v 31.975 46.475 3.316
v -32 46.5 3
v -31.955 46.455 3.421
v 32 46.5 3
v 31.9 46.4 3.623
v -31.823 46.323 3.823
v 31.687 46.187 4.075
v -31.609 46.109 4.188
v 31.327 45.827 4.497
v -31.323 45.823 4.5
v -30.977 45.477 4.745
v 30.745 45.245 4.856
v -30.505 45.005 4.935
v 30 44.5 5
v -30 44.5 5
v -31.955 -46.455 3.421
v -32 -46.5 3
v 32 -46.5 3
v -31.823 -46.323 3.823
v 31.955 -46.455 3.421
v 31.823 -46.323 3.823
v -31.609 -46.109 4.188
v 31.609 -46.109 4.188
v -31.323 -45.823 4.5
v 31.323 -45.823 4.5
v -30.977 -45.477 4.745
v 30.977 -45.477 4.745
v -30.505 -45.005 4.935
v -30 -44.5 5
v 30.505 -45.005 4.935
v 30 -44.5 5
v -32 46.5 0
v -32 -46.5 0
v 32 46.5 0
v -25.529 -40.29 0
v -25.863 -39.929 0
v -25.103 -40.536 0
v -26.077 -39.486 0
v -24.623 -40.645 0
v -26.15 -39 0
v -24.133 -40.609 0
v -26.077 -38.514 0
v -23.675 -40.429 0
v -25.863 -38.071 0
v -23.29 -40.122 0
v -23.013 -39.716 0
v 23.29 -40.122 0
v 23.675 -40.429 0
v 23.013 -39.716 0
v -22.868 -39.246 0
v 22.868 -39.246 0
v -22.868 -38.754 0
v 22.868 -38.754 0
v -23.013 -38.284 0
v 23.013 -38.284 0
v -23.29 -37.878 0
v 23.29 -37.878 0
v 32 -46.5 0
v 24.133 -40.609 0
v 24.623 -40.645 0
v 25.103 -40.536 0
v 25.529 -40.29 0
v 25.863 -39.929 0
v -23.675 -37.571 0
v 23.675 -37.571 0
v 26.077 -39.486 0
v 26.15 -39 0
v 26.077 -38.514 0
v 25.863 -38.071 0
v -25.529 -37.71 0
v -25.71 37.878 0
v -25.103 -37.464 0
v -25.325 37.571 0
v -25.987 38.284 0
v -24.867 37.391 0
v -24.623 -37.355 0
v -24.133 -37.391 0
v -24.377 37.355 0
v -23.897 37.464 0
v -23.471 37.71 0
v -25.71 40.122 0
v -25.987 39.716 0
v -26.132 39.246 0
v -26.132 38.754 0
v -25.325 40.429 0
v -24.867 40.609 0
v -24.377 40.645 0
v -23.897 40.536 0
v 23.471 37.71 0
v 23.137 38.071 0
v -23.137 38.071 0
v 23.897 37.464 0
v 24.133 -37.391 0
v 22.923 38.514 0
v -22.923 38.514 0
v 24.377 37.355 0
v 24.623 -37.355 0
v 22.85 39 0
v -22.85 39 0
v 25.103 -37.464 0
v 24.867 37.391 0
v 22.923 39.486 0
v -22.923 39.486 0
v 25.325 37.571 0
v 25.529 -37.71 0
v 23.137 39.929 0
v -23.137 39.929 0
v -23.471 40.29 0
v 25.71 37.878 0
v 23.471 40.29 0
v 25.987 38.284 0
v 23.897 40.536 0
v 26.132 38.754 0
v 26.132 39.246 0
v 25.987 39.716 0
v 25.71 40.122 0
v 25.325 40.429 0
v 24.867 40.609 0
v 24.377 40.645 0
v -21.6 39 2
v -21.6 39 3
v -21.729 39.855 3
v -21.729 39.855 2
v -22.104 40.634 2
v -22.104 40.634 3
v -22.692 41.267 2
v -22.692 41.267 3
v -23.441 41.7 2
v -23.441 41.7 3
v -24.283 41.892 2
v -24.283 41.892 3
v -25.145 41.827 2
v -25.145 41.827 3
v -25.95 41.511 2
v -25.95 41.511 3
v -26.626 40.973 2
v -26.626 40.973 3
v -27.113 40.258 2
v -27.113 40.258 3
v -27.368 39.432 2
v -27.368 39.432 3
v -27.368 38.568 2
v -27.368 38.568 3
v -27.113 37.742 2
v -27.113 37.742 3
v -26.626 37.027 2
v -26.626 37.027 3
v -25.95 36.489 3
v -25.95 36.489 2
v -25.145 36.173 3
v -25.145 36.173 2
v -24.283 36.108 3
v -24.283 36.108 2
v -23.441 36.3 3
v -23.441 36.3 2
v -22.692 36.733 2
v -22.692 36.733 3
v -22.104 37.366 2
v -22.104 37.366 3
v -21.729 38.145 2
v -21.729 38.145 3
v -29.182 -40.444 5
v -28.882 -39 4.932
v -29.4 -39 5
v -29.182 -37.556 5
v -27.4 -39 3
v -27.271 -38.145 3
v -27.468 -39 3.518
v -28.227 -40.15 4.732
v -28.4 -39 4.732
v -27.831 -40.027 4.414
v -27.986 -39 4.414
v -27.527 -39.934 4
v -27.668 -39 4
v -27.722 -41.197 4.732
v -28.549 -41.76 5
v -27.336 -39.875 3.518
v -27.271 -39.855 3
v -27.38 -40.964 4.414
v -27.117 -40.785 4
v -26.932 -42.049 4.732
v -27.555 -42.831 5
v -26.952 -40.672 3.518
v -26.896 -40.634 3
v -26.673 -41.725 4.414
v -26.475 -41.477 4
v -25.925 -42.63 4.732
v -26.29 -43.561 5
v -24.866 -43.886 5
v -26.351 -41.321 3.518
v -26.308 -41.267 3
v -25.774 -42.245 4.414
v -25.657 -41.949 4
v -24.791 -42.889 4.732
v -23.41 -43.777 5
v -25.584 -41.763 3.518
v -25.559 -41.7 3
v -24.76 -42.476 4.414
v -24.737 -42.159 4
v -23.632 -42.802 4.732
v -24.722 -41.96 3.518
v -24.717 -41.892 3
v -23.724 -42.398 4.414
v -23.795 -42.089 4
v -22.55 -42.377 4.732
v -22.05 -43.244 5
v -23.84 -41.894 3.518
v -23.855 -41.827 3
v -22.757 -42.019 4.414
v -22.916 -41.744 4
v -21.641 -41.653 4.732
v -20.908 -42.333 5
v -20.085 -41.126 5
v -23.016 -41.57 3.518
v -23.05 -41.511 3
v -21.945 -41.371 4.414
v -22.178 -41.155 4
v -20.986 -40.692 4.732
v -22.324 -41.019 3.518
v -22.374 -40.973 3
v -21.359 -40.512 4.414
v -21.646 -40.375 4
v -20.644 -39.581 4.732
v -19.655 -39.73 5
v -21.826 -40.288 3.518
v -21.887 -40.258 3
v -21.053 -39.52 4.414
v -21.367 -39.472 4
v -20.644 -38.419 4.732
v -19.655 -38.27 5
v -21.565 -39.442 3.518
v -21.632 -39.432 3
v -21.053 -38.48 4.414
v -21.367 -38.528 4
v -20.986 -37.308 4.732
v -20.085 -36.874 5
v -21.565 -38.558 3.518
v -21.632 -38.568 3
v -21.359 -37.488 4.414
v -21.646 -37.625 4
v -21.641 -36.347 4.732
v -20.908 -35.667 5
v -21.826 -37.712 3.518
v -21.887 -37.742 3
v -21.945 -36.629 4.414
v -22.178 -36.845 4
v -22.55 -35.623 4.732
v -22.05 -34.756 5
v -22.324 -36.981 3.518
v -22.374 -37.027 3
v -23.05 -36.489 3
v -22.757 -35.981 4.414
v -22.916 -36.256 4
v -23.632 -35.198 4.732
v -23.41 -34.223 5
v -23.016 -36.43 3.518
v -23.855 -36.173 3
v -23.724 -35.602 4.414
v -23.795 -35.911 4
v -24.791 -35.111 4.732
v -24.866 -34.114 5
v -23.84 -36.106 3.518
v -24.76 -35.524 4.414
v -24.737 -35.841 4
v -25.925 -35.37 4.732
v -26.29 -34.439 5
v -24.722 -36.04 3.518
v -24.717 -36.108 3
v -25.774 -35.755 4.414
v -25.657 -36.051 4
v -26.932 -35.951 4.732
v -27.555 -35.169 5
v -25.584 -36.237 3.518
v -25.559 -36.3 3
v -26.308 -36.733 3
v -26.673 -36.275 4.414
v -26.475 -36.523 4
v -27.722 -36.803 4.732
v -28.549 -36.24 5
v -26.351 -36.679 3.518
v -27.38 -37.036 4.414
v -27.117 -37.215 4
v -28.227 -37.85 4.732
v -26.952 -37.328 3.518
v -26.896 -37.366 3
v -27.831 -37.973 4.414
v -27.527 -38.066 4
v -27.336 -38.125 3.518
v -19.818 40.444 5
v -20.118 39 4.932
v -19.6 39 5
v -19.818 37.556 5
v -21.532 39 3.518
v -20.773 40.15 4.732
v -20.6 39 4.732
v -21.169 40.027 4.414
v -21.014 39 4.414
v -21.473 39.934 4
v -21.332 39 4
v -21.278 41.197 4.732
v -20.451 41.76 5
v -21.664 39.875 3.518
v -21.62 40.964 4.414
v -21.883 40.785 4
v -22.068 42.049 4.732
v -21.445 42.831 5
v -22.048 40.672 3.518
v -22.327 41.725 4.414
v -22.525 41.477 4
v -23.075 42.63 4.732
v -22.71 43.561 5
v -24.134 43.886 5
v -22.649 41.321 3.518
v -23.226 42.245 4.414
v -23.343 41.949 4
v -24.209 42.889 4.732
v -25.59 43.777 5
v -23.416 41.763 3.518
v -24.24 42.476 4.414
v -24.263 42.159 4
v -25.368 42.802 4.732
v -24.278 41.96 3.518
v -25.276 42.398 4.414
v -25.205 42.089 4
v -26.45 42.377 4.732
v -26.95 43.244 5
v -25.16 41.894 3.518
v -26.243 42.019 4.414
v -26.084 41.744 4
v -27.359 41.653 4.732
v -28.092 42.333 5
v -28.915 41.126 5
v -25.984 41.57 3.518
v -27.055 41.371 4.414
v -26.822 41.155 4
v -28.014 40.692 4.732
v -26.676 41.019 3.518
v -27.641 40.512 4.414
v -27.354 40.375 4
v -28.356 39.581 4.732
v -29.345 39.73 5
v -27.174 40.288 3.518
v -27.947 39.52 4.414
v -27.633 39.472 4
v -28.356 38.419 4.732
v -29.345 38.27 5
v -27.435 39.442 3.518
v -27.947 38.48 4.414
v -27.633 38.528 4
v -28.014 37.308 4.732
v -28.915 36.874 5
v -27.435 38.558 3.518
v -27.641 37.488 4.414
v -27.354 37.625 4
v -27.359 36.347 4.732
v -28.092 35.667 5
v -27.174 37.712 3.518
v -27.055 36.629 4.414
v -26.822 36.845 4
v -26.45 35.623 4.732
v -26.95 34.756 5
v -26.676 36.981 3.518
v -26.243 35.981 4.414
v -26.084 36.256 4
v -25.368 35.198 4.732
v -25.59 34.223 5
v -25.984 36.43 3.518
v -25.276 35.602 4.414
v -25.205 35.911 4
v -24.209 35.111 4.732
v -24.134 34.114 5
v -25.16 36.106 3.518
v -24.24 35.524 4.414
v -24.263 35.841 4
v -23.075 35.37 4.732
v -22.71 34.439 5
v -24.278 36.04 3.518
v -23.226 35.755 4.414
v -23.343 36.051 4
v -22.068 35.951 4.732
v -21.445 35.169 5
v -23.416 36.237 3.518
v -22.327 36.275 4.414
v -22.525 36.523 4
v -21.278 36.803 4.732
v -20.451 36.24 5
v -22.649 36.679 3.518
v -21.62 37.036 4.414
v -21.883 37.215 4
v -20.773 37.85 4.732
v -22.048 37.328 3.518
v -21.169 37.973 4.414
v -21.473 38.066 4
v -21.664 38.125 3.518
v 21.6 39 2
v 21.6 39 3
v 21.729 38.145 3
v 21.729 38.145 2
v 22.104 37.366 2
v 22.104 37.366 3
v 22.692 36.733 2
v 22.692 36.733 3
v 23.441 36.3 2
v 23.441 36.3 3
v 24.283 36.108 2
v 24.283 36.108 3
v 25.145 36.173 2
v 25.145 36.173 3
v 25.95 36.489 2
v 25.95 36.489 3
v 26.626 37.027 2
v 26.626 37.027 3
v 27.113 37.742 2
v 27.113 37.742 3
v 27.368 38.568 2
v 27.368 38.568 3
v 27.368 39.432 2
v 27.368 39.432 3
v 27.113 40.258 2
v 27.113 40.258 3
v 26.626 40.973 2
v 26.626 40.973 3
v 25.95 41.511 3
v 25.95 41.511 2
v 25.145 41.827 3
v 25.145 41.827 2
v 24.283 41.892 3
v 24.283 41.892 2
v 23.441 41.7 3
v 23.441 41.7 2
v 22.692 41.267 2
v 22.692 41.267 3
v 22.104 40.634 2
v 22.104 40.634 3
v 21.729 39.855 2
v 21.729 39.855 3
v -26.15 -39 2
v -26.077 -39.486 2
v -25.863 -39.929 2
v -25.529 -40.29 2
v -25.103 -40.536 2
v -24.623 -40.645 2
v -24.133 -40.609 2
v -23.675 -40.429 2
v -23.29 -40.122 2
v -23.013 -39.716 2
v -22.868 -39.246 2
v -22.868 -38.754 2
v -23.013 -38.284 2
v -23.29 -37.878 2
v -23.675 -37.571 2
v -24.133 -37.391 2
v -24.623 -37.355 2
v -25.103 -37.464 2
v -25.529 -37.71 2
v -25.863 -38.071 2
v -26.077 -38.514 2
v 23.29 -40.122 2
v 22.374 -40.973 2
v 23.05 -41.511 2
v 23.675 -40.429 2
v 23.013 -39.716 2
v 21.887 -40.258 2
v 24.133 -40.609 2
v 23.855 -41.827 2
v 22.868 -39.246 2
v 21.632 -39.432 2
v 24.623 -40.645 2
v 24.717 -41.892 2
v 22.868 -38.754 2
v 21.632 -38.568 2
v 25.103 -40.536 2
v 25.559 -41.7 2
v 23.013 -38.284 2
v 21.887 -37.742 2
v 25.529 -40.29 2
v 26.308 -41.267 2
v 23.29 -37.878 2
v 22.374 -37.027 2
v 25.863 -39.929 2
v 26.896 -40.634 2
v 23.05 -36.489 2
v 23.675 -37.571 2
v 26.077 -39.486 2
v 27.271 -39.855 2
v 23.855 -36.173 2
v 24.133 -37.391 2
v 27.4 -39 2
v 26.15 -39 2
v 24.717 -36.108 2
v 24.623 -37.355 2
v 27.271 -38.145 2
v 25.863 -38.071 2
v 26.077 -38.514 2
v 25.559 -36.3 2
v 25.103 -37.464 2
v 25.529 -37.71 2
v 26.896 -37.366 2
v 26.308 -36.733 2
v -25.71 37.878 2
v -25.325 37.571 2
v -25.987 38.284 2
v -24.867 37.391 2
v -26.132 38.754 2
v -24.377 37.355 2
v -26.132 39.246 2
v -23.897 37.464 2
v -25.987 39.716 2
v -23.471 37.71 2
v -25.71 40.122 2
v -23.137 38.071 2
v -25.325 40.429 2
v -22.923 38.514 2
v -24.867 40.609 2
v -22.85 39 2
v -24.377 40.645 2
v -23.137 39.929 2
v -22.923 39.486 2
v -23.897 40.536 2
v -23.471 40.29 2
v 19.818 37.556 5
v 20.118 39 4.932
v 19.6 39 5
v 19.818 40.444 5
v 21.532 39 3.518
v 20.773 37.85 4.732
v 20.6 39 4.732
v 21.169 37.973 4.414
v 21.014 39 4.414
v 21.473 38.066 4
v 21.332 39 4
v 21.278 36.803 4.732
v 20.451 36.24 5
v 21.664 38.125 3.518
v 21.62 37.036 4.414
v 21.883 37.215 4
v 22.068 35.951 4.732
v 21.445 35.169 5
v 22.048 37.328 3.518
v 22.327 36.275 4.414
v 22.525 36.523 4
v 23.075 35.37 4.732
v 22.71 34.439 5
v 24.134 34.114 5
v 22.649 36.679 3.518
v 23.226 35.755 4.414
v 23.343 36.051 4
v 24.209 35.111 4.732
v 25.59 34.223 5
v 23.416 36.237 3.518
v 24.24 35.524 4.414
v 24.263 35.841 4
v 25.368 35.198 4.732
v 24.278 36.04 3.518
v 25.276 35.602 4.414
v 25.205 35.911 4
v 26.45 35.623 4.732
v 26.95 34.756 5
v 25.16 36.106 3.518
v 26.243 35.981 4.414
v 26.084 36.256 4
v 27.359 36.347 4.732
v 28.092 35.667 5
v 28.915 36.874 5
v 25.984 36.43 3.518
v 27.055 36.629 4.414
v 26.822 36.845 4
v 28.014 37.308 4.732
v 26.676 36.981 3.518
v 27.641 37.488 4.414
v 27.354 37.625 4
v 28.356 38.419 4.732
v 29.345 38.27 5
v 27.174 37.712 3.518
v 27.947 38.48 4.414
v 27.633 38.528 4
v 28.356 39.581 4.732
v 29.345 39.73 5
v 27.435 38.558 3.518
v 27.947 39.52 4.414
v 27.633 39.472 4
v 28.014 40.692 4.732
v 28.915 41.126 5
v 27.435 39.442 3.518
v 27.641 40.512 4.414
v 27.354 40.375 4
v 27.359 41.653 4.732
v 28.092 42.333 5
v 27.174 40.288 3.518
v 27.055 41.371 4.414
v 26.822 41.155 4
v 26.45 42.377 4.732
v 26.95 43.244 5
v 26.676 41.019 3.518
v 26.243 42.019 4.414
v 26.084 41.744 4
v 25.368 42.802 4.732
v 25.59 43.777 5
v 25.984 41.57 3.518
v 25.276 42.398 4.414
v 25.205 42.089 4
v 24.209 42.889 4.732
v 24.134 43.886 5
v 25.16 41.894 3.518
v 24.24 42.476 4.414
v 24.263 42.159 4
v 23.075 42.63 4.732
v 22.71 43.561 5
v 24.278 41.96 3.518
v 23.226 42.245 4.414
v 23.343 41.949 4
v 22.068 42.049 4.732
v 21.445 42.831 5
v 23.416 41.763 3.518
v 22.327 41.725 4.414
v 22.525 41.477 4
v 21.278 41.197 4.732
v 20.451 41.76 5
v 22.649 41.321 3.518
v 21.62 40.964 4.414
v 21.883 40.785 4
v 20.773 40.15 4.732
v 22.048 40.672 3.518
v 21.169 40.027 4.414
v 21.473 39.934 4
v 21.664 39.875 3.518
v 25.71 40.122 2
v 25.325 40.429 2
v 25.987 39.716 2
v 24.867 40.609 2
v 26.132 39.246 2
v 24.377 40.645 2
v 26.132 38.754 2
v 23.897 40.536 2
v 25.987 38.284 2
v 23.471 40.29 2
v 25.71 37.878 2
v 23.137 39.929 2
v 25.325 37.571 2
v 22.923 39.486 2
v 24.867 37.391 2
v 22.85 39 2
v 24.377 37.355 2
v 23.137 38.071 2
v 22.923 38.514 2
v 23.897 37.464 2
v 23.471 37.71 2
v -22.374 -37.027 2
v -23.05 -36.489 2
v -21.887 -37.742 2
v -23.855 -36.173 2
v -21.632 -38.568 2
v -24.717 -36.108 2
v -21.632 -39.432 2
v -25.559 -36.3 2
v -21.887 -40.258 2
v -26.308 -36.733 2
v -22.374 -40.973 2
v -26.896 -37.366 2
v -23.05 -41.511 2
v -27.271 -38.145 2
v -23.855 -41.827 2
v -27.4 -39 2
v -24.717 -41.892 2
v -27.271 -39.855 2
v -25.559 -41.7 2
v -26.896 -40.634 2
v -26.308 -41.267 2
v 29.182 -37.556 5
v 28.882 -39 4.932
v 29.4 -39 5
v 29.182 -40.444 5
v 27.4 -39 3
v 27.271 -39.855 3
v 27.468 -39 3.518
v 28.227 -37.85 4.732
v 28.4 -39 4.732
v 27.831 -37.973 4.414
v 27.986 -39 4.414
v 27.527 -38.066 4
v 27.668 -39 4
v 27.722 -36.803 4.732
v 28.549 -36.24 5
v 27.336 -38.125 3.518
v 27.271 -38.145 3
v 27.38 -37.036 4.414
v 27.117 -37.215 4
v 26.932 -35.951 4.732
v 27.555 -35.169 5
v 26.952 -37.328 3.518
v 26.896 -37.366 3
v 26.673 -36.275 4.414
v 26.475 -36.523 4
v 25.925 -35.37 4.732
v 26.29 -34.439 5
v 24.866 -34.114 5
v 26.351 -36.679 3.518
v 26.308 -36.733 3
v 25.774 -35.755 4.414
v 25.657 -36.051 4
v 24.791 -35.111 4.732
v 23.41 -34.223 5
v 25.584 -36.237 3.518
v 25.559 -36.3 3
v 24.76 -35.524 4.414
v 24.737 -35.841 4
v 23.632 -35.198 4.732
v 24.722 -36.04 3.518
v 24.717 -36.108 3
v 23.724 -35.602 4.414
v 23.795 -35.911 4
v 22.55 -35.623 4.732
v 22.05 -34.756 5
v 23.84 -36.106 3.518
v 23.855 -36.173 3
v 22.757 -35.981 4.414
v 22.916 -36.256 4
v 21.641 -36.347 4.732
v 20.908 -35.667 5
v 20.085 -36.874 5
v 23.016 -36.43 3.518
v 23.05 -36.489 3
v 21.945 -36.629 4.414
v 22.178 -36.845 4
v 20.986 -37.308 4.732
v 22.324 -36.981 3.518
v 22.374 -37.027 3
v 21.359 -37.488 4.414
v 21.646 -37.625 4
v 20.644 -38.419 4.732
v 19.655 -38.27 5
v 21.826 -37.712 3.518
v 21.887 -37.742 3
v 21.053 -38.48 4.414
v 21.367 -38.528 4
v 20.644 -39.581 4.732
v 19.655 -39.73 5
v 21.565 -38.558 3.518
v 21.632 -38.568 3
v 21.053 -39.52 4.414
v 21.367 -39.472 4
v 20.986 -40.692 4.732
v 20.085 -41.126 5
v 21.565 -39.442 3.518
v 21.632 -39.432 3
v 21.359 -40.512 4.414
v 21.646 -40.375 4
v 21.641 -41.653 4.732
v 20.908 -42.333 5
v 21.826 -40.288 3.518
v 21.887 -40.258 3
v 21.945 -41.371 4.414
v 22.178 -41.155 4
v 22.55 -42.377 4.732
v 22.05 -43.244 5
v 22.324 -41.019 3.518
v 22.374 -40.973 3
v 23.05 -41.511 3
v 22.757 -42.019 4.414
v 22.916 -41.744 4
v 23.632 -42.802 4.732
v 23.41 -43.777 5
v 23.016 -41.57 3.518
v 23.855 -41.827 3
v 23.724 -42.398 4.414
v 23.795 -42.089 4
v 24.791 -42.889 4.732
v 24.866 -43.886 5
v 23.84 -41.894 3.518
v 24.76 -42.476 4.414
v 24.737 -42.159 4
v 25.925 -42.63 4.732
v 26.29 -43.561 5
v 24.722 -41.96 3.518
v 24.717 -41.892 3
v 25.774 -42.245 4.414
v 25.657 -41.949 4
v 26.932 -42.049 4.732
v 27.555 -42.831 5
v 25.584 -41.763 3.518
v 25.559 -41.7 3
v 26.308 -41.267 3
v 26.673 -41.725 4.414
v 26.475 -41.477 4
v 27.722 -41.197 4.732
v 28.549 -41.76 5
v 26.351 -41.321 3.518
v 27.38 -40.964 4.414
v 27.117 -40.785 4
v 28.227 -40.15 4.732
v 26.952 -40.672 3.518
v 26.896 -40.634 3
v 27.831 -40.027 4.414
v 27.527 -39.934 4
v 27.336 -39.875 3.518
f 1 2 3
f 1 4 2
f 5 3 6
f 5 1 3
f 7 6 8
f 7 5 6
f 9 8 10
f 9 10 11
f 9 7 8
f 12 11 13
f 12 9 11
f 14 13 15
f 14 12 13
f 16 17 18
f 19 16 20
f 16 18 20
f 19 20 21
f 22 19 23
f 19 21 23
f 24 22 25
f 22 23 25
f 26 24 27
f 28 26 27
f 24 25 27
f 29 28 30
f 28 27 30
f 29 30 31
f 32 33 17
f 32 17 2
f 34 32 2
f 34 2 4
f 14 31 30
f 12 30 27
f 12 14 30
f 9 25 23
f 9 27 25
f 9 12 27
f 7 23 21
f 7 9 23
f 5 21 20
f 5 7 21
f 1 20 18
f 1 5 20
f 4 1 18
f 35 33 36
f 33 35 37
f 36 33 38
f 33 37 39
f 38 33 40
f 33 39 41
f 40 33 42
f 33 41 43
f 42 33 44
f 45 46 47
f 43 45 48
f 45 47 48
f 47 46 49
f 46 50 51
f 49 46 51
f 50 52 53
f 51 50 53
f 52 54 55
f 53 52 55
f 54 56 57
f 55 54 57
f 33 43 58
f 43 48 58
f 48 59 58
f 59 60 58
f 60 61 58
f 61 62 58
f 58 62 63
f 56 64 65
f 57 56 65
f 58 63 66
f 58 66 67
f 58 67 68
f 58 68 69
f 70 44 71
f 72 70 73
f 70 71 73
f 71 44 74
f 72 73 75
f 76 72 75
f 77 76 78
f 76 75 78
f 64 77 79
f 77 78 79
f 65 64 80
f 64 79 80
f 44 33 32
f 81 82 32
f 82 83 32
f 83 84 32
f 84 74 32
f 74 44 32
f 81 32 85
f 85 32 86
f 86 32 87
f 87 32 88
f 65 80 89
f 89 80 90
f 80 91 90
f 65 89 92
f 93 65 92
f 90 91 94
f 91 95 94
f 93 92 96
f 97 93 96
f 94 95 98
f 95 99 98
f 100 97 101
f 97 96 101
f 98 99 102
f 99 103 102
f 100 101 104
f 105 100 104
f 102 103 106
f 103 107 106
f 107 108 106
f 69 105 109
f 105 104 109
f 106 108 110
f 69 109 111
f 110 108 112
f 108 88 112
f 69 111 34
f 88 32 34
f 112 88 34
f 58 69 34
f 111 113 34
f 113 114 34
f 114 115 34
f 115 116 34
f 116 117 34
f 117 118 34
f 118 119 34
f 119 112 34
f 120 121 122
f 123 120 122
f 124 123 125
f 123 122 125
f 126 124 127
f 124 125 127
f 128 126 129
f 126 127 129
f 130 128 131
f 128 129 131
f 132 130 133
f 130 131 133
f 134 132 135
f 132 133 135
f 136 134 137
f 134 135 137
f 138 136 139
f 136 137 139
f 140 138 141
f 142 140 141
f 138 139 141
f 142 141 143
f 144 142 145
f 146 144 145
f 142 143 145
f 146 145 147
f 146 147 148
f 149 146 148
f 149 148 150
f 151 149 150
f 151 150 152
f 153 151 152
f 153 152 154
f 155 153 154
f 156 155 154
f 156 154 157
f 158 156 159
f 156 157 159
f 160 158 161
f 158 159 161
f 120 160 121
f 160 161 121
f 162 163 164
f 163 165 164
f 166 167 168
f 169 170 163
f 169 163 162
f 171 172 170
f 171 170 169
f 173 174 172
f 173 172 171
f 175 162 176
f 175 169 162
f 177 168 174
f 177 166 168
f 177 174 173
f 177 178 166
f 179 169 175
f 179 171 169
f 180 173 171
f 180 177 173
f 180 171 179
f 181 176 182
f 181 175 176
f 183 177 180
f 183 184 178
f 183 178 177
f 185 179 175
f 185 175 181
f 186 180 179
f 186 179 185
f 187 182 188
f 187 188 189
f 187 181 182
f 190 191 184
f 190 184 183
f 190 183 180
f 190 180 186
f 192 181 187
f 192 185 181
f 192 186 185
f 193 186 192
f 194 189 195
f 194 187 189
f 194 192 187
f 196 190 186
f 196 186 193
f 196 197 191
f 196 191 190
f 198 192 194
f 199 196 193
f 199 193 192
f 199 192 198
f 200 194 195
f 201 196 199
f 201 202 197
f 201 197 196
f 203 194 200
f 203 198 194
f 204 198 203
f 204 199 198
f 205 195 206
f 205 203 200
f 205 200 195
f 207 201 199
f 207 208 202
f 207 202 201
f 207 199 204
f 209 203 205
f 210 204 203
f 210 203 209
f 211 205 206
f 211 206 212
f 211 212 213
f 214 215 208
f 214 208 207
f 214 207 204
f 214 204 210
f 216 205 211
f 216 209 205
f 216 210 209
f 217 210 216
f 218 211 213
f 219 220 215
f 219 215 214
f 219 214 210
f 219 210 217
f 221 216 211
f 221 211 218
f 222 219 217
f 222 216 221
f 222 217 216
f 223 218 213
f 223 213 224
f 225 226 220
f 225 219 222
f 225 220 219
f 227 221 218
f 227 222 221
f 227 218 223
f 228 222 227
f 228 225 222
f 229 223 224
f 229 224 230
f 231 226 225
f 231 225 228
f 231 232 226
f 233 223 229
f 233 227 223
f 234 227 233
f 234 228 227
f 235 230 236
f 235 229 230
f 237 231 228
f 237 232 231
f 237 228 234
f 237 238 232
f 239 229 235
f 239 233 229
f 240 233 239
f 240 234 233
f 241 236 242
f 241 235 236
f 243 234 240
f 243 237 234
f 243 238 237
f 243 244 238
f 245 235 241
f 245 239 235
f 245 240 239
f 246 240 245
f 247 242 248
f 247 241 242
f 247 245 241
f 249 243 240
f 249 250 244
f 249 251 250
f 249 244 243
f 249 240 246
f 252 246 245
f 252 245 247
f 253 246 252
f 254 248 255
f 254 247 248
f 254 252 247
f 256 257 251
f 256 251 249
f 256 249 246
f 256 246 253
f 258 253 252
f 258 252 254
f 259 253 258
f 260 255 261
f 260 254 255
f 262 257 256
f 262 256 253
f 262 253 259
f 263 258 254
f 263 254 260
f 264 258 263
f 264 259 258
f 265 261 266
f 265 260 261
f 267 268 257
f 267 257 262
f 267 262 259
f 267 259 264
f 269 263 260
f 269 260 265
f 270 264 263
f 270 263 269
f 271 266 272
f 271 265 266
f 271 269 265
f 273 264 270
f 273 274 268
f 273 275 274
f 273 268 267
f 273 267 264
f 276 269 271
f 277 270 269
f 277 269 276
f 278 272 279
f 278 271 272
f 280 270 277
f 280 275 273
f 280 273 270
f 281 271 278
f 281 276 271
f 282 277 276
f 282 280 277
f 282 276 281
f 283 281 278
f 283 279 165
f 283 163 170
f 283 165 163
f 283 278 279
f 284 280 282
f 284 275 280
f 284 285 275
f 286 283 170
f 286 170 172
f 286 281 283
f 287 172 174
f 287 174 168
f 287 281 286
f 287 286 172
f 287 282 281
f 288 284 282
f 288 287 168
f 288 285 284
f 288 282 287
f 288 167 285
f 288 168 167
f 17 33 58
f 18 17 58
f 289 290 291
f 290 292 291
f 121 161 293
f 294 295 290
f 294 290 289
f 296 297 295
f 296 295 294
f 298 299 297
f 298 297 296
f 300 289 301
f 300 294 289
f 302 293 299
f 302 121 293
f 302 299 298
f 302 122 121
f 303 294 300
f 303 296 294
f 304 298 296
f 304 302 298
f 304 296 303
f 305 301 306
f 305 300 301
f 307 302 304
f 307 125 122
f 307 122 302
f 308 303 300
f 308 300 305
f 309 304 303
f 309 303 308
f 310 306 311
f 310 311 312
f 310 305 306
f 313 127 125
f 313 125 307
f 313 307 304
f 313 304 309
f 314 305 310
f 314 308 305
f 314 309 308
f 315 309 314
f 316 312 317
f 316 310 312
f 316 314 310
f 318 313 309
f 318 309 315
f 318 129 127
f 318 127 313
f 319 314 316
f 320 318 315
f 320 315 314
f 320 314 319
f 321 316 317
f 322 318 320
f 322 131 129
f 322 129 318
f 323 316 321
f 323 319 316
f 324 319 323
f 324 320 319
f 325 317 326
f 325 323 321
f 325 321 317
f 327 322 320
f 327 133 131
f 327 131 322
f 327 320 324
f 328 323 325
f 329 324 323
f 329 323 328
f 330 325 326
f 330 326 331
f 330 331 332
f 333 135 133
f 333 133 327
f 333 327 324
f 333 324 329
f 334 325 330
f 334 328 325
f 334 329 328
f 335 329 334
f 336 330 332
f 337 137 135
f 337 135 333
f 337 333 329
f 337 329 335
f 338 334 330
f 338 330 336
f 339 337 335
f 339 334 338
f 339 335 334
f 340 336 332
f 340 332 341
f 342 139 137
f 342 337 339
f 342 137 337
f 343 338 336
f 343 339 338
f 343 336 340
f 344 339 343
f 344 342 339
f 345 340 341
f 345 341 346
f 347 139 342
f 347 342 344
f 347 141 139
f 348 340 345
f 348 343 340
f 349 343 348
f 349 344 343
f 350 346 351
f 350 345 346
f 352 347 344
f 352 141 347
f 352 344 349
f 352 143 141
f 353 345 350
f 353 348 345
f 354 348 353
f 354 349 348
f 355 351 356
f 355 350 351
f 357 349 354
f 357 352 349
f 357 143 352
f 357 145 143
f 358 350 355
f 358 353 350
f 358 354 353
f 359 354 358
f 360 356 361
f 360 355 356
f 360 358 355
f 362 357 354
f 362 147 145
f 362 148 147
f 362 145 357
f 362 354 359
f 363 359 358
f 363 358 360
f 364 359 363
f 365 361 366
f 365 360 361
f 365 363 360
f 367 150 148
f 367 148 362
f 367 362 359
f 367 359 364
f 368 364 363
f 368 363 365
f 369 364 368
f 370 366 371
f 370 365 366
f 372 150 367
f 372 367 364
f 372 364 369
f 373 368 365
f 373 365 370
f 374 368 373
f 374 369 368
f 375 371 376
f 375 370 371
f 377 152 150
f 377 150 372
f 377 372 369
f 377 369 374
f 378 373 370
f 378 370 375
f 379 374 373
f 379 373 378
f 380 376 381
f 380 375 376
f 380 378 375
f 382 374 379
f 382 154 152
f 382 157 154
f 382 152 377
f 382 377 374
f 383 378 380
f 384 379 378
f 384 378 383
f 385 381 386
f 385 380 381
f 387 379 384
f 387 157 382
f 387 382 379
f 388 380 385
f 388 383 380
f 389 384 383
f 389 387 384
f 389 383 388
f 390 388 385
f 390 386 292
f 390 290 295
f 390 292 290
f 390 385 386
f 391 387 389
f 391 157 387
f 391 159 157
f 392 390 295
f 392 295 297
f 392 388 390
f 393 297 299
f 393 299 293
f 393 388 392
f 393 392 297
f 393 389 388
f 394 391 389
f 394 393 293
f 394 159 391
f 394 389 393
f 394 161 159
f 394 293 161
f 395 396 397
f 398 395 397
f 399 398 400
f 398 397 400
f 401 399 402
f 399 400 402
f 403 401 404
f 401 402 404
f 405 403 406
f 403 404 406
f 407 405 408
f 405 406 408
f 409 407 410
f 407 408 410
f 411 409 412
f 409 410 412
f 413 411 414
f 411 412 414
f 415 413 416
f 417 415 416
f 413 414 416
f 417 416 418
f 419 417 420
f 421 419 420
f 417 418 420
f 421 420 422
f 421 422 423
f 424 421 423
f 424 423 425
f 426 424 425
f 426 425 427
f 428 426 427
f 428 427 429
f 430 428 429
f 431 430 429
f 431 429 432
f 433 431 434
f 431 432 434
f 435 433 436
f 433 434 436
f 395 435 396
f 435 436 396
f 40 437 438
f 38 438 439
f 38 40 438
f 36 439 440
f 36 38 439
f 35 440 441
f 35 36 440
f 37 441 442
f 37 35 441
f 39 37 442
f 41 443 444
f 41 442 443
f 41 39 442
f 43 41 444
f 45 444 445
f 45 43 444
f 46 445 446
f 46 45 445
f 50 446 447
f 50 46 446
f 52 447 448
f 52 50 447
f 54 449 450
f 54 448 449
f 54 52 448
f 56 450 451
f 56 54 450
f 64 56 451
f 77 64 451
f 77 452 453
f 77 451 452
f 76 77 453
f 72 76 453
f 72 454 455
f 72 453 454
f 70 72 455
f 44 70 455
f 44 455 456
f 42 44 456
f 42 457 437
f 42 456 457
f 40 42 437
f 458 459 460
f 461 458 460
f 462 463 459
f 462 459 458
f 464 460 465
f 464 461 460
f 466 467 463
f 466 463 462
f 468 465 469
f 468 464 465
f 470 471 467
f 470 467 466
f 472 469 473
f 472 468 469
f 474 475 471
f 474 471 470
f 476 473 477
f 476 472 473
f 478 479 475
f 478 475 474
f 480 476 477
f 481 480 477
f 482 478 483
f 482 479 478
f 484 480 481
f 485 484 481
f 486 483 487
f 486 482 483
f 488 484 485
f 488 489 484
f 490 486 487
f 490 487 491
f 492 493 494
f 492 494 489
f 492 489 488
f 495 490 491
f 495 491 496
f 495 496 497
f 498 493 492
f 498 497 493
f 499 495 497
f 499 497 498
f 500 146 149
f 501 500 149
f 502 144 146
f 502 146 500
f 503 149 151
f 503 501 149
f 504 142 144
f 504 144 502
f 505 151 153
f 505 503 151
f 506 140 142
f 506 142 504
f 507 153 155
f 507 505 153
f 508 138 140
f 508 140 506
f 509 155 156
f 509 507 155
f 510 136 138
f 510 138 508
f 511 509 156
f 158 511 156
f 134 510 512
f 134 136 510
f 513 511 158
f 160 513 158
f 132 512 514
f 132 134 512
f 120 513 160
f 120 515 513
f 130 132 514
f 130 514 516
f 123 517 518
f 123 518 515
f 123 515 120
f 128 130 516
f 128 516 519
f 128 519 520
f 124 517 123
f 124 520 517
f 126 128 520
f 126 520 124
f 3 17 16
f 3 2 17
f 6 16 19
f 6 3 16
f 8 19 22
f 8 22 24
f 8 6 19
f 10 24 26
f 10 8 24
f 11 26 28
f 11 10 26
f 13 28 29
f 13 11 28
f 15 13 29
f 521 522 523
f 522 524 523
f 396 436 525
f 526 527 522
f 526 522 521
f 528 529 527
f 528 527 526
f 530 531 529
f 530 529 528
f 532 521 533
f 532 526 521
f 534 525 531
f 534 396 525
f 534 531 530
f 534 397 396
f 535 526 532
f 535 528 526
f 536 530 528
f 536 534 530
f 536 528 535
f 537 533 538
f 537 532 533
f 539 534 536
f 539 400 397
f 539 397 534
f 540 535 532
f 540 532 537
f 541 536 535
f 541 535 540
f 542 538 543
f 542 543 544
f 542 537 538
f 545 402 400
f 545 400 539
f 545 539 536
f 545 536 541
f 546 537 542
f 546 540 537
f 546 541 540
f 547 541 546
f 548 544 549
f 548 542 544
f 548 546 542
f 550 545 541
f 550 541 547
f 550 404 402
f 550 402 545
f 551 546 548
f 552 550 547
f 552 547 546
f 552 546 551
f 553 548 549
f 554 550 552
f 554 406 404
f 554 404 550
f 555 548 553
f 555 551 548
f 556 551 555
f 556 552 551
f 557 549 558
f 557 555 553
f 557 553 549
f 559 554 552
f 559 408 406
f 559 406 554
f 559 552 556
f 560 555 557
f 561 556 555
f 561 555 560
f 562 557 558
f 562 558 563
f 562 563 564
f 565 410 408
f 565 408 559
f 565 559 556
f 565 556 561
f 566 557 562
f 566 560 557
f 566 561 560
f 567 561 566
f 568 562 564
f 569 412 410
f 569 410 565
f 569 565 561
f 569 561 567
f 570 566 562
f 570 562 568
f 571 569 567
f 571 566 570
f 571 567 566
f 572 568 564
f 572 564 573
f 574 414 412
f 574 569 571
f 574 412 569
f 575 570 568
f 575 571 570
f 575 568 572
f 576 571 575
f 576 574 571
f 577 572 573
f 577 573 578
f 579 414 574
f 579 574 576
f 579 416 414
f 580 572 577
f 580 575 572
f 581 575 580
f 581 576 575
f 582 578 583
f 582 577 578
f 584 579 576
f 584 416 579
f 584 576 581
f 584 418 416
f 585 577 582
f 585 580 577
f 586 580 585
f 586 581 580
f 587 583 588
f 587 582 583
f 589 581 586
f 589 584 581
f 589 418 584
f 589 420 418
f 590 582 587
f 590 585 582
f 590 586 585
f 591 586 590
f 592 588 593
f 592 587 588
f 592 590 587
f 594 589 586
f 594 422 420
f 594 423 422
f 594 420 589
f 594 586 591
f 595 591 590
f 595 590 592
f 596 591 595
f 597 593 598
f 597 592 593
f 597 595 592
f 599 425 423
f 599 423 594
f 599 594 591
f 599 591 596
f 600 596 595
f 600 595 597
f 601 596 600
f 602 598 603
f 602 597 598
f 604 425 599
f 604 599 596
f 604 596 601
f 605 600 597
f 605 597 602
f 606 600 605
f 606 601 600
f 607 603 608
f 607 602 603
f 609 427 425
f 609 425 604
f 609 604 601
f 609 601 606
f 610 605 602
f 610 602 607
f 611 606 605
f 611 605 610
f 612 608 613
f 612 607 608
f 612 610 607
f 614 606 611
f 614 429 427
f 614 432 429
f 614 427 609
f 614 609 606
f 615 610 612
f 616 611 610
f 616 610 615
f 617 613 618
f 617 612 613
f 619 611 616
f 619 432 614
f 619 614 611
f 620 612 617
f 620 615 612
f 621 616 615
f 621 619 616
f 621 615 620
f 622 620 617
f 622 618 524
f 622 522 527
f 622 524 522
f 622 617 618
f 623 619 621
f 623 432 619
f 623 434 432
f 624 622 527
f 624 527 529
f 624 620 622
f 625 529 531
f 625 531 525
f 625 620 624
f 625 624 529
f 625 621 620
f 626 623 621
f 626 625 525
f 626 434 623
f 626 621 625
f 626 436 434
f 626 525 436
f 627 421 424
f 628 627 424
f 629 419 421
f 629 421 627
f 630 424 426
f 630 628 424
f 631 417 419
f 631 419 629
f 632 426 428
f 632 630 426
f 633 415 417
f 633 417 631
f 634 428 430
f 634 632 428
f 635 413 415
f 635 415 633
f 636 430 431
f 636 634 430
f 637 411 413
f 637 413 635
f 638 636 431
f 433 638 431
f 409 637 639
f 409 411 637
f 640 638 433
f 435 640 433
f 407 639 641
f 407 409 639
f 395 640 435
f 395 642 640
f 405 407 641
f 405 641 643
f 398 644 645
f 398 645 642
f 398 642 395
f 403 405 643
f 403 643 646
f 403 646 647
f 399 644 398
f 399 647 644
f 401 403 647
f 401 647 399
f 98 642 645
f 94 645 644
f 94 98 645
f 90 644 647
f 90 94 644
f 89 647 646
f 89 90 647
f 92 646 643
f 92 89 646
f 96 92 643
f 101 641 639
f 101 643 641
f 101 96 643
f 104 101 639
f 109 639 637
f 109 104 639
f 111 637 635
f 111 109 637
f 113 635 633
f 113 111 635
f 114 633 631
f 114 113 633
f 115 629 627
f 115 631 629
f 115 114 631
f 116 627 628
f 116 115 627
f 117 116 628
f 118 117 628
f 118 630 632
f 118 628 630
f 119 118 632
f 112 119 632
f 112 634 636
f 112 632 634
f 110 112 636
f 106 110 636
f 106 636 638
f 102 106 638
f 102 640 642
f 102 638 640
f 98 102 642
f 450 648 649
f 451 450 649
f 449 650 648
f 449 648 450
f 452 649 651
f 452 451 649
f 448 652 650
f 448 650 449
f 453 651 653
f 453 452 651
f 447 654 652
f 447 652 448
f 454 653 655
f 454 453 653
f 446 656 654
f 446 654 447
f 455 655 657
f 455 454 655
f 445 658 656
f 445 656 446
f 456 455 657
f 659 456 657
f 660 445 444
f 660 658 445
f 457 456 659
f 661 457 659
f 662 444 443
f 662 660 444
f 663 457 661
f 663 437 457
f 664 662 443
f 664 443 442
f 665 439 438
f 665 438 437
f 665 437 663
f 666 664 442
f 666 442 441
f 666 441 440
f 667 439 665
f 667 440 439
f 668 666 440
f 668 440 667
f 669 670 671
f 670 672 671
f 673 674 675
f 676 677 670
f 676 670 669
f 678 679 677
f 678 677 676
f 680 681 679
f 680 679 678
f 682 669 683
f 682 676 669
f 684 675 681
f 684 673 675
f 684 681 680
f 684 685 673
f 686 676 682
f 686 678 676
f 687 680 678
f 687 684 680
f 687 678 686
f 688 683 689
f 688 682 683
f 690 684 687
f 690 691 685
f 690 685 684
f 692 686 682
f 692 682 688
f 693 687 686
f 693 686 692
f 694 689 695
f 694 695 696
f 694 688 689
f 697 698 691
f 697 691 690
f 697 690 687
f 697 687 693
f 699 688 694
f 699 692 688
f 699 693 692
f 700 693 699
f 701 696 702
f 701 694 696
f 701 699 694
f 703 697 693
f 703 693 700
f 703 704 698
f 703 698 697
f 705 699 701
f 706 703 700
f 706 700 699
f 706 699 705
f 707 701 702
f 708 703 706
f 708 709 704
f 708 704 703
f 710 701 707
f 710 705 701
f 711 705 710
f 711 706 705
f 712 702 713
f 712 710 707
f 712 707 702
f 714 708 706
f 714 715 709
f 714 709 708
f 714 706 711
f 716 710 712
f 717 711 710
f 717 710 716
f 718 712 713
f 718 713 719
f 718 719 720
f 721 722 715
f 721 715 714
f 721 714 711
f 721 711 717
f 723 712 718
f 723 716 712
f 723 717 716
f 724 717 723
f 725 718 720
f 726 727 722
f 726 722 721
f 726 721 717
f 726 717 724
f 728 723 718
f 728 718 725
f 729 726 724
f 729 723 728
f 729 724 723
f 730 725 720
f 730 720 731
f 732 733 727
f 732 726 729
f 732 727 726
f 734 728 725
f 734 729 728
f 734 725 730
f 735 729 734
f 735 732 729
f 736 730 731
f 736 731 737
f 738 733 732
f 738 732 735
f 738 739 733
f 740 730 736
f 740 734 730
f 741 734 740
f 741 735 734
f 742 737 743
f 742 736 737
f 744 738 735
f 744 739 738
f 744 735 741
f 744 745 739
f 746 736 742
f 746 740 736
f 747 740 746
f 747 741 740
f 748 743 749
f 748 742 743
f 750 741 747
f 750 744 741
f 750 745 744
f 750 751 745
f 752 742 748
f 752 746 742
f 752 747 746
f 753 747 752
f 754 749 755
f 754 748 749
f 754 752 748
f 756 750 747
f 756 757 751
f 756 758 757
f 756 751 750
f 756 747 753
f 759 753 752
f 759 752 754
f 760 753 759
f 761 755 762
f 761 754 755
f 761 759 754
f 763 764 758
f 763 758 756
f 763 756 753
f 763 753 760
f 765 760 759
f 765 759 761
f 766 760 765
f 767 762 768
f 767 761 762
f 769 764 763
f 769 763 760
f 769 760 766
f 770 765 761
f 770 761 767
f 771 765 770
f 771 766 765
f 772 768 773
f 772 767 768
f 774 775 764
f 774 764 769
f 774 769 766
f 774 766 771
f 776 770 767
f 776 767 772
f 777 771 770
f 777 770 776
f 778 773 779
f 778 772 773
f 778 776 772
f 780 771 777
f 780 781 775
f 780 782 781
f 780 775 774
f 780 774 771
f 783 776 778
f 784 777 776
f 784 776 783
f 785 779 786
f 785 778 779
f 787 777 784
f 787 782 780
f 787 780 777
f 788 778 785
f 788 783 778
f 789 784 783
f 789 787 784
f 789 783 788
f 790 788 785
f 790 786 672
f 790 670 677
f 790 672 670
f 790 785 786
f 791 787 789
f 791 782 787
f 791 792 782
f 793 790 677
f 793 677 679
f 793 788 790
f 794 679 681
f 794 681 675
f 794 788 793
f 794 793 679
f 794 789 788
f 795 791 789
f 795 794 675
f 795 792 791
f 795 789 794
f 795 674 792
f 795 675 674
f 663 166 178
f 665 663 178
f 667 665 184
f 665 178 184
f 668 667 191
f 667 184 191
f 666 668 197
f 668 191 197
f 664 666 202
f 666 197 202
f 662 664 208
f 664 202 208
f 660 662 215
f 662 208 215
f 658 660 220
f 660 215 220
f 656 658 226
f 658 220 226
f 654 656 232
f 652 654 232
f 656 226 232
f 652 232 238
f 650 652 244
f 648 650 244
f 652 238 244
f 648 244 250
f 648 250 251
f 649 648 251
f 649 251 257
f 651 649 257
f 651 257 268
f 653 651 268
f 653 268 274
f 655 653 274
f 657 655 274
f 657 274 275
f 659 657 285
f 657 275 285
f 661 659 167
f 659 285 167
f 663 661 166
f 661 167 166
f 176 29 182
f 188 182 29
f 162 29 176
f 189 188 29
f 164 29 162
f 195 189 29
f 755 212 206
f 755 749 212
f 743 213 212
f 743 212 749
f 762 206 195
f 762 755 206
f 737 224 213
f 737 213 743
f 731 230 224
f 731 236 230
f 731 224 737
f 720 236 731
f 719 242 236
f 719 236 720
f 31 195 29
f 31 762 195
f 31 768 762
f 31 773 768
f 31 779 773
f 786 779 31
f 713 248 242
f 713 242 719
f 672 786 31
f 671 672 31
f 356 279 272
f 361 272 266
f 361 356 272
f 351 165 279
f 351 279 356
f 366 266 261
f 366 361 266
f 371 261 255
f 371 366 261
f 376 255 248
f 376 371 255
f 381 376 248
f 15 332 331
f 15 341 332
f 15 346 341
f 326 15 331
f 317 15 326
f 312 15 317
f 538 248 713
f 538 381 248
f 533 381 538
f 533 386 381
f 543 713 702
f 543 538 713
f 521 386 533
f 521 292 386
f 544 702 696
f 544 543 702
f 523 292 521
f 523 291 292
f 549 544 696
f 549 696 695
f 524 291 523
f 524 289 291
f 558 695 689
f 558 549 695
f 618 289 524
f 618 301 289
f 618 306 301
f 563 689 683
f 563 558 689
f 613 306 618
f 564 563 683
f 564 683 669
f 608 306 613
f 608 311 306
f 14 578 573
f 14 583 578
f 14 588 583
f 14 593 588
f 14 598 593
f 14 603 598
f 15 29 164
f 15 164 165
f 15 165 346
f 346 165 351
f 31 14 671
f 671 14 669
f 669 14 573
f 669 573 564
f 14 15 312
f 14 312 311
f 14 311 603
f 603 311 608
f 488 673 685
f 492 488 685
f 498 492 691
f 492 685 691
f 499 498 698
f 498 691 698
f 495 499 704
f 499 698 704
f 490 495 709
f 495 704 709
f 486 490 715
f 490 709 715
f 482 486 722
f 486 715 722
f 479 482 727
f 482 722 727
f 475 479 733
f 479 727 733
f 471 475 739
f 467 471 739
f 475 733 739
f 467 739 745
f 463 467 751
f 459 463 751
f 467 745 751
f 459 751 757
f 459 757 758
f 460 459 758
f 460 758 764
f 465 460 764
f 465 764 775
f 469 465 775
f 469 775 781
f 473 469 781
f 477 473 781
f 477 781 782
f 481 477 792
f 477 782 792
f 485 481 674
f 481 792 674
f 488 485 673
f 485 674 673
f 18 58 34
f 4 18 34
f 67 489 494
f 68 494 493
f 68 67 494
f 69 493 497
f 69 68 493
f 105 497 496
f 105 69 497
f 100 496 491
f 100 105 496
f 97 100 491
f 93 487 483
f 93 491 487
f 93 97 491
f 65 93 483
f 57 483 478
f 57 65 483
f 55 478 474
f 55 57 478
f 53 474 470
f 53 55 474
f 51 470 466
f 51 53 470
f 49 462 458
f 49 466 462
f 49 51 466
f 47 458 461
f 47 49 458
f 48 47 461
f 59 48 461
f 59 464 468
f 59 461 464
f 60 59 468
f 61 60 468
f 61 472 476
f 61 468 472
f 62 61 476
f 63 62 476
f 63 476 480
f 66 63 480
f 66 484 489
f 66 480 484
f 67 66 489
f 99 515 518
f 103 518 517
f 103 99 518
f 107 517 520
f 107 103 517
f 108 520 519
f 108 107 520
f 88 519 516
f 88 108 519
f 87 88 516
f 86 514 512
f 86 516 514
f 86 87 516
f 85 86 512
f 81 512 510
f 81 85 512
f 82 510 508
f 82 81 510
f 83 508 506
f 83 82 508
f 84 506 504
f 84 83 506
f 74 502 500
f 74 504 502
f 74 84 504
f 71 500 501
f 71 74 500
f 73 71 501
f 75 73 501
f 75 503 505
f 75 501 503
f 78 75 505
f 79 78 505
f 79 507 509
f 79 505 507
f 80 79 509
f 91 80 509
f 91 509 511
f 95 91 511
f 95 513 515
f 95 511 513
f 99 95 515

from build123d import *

# Parameters (mm, degrees)
SKIZZE1_W                       = 64
SKIZZE1_H                       = 93
SKIZZE1_R                       = 1.65
AUFSATZ_LINEAR_AUSTRAGEN2_DEPTH = 5
SKIZZE2_R                       = 2.9
SCHNITT_LINEAR_AUSTRAGEN1_DEPTH = 3
VERRUNDUNG1_R                   = 2


with BuildPart() as part:
    # Skizze1 → Aufsatz-Linear austragen2 (new body)
    with BuildSketch(Plane.XY):
        Rectangle(SKIZZE1_W, SKIZZE1_H)
        with Locations((-24.5, 39)):
            Circle(SKIZZE1_R, mode=Mode.SUBTRACT)
        with Locations(Location((24.5, 39, 0), (0, 0, 180))):
            Circle(SKIZZE1_R, mode=Mode.SUBTRACT)
        with Locations((24.5, -39)):
            Circle(SKIZZE1_R, mode=Mode.SUBTRACT)
        with Locations(Location((-24.5, -39, 0), (0, 0, 180))):
            Circle(SKIZZE1_R, mode=Mode.SUBTRACT)
    extrude(amount=AUFSATZ_LINEAR_AUSTRAGEN2_DEPTH)

    # Skizze2 → Schnitt-Linear austragen1 (cut)
    with BuildSketch(Plane.XY.offset(5)):
        with Locations((-24.5, 39)):
            Circle(SKIZZE2_R)
        with Locations(Location((24.5, 39, 0), (0, 0, 180))):
            Circle(SKIZZE2_R)
        with Locations((24.5, -39)):
            Circle(SKIZZE2_R)
        with Locations(Location((-24.5, -39, 0), (0, 0, 180))):
            Circle(SKIZZE2_R)
    extrude(amount=-SCHNITT_LINEAR_AUSTRAGEN1_DEPTH, mode=Mode.SUBTRACT)

    # Verrundung1
    verrundung1_edges = [part.edges().sort_by_distance(p)[0] for p in [
        (-32, 0, 5),
        (0, -46.5, 5),
        (-21.6, -39, 5),
        (21.6, -39, 5),
        (27.4, 39, 5),
        (-27.4, 39, 5),
        (32, 0, 5),
        (0, 46.5, 5),
    ]]
    fillet(verrundung1_edges, radius=VERRUNDUNG1_R)


solid = part.part
